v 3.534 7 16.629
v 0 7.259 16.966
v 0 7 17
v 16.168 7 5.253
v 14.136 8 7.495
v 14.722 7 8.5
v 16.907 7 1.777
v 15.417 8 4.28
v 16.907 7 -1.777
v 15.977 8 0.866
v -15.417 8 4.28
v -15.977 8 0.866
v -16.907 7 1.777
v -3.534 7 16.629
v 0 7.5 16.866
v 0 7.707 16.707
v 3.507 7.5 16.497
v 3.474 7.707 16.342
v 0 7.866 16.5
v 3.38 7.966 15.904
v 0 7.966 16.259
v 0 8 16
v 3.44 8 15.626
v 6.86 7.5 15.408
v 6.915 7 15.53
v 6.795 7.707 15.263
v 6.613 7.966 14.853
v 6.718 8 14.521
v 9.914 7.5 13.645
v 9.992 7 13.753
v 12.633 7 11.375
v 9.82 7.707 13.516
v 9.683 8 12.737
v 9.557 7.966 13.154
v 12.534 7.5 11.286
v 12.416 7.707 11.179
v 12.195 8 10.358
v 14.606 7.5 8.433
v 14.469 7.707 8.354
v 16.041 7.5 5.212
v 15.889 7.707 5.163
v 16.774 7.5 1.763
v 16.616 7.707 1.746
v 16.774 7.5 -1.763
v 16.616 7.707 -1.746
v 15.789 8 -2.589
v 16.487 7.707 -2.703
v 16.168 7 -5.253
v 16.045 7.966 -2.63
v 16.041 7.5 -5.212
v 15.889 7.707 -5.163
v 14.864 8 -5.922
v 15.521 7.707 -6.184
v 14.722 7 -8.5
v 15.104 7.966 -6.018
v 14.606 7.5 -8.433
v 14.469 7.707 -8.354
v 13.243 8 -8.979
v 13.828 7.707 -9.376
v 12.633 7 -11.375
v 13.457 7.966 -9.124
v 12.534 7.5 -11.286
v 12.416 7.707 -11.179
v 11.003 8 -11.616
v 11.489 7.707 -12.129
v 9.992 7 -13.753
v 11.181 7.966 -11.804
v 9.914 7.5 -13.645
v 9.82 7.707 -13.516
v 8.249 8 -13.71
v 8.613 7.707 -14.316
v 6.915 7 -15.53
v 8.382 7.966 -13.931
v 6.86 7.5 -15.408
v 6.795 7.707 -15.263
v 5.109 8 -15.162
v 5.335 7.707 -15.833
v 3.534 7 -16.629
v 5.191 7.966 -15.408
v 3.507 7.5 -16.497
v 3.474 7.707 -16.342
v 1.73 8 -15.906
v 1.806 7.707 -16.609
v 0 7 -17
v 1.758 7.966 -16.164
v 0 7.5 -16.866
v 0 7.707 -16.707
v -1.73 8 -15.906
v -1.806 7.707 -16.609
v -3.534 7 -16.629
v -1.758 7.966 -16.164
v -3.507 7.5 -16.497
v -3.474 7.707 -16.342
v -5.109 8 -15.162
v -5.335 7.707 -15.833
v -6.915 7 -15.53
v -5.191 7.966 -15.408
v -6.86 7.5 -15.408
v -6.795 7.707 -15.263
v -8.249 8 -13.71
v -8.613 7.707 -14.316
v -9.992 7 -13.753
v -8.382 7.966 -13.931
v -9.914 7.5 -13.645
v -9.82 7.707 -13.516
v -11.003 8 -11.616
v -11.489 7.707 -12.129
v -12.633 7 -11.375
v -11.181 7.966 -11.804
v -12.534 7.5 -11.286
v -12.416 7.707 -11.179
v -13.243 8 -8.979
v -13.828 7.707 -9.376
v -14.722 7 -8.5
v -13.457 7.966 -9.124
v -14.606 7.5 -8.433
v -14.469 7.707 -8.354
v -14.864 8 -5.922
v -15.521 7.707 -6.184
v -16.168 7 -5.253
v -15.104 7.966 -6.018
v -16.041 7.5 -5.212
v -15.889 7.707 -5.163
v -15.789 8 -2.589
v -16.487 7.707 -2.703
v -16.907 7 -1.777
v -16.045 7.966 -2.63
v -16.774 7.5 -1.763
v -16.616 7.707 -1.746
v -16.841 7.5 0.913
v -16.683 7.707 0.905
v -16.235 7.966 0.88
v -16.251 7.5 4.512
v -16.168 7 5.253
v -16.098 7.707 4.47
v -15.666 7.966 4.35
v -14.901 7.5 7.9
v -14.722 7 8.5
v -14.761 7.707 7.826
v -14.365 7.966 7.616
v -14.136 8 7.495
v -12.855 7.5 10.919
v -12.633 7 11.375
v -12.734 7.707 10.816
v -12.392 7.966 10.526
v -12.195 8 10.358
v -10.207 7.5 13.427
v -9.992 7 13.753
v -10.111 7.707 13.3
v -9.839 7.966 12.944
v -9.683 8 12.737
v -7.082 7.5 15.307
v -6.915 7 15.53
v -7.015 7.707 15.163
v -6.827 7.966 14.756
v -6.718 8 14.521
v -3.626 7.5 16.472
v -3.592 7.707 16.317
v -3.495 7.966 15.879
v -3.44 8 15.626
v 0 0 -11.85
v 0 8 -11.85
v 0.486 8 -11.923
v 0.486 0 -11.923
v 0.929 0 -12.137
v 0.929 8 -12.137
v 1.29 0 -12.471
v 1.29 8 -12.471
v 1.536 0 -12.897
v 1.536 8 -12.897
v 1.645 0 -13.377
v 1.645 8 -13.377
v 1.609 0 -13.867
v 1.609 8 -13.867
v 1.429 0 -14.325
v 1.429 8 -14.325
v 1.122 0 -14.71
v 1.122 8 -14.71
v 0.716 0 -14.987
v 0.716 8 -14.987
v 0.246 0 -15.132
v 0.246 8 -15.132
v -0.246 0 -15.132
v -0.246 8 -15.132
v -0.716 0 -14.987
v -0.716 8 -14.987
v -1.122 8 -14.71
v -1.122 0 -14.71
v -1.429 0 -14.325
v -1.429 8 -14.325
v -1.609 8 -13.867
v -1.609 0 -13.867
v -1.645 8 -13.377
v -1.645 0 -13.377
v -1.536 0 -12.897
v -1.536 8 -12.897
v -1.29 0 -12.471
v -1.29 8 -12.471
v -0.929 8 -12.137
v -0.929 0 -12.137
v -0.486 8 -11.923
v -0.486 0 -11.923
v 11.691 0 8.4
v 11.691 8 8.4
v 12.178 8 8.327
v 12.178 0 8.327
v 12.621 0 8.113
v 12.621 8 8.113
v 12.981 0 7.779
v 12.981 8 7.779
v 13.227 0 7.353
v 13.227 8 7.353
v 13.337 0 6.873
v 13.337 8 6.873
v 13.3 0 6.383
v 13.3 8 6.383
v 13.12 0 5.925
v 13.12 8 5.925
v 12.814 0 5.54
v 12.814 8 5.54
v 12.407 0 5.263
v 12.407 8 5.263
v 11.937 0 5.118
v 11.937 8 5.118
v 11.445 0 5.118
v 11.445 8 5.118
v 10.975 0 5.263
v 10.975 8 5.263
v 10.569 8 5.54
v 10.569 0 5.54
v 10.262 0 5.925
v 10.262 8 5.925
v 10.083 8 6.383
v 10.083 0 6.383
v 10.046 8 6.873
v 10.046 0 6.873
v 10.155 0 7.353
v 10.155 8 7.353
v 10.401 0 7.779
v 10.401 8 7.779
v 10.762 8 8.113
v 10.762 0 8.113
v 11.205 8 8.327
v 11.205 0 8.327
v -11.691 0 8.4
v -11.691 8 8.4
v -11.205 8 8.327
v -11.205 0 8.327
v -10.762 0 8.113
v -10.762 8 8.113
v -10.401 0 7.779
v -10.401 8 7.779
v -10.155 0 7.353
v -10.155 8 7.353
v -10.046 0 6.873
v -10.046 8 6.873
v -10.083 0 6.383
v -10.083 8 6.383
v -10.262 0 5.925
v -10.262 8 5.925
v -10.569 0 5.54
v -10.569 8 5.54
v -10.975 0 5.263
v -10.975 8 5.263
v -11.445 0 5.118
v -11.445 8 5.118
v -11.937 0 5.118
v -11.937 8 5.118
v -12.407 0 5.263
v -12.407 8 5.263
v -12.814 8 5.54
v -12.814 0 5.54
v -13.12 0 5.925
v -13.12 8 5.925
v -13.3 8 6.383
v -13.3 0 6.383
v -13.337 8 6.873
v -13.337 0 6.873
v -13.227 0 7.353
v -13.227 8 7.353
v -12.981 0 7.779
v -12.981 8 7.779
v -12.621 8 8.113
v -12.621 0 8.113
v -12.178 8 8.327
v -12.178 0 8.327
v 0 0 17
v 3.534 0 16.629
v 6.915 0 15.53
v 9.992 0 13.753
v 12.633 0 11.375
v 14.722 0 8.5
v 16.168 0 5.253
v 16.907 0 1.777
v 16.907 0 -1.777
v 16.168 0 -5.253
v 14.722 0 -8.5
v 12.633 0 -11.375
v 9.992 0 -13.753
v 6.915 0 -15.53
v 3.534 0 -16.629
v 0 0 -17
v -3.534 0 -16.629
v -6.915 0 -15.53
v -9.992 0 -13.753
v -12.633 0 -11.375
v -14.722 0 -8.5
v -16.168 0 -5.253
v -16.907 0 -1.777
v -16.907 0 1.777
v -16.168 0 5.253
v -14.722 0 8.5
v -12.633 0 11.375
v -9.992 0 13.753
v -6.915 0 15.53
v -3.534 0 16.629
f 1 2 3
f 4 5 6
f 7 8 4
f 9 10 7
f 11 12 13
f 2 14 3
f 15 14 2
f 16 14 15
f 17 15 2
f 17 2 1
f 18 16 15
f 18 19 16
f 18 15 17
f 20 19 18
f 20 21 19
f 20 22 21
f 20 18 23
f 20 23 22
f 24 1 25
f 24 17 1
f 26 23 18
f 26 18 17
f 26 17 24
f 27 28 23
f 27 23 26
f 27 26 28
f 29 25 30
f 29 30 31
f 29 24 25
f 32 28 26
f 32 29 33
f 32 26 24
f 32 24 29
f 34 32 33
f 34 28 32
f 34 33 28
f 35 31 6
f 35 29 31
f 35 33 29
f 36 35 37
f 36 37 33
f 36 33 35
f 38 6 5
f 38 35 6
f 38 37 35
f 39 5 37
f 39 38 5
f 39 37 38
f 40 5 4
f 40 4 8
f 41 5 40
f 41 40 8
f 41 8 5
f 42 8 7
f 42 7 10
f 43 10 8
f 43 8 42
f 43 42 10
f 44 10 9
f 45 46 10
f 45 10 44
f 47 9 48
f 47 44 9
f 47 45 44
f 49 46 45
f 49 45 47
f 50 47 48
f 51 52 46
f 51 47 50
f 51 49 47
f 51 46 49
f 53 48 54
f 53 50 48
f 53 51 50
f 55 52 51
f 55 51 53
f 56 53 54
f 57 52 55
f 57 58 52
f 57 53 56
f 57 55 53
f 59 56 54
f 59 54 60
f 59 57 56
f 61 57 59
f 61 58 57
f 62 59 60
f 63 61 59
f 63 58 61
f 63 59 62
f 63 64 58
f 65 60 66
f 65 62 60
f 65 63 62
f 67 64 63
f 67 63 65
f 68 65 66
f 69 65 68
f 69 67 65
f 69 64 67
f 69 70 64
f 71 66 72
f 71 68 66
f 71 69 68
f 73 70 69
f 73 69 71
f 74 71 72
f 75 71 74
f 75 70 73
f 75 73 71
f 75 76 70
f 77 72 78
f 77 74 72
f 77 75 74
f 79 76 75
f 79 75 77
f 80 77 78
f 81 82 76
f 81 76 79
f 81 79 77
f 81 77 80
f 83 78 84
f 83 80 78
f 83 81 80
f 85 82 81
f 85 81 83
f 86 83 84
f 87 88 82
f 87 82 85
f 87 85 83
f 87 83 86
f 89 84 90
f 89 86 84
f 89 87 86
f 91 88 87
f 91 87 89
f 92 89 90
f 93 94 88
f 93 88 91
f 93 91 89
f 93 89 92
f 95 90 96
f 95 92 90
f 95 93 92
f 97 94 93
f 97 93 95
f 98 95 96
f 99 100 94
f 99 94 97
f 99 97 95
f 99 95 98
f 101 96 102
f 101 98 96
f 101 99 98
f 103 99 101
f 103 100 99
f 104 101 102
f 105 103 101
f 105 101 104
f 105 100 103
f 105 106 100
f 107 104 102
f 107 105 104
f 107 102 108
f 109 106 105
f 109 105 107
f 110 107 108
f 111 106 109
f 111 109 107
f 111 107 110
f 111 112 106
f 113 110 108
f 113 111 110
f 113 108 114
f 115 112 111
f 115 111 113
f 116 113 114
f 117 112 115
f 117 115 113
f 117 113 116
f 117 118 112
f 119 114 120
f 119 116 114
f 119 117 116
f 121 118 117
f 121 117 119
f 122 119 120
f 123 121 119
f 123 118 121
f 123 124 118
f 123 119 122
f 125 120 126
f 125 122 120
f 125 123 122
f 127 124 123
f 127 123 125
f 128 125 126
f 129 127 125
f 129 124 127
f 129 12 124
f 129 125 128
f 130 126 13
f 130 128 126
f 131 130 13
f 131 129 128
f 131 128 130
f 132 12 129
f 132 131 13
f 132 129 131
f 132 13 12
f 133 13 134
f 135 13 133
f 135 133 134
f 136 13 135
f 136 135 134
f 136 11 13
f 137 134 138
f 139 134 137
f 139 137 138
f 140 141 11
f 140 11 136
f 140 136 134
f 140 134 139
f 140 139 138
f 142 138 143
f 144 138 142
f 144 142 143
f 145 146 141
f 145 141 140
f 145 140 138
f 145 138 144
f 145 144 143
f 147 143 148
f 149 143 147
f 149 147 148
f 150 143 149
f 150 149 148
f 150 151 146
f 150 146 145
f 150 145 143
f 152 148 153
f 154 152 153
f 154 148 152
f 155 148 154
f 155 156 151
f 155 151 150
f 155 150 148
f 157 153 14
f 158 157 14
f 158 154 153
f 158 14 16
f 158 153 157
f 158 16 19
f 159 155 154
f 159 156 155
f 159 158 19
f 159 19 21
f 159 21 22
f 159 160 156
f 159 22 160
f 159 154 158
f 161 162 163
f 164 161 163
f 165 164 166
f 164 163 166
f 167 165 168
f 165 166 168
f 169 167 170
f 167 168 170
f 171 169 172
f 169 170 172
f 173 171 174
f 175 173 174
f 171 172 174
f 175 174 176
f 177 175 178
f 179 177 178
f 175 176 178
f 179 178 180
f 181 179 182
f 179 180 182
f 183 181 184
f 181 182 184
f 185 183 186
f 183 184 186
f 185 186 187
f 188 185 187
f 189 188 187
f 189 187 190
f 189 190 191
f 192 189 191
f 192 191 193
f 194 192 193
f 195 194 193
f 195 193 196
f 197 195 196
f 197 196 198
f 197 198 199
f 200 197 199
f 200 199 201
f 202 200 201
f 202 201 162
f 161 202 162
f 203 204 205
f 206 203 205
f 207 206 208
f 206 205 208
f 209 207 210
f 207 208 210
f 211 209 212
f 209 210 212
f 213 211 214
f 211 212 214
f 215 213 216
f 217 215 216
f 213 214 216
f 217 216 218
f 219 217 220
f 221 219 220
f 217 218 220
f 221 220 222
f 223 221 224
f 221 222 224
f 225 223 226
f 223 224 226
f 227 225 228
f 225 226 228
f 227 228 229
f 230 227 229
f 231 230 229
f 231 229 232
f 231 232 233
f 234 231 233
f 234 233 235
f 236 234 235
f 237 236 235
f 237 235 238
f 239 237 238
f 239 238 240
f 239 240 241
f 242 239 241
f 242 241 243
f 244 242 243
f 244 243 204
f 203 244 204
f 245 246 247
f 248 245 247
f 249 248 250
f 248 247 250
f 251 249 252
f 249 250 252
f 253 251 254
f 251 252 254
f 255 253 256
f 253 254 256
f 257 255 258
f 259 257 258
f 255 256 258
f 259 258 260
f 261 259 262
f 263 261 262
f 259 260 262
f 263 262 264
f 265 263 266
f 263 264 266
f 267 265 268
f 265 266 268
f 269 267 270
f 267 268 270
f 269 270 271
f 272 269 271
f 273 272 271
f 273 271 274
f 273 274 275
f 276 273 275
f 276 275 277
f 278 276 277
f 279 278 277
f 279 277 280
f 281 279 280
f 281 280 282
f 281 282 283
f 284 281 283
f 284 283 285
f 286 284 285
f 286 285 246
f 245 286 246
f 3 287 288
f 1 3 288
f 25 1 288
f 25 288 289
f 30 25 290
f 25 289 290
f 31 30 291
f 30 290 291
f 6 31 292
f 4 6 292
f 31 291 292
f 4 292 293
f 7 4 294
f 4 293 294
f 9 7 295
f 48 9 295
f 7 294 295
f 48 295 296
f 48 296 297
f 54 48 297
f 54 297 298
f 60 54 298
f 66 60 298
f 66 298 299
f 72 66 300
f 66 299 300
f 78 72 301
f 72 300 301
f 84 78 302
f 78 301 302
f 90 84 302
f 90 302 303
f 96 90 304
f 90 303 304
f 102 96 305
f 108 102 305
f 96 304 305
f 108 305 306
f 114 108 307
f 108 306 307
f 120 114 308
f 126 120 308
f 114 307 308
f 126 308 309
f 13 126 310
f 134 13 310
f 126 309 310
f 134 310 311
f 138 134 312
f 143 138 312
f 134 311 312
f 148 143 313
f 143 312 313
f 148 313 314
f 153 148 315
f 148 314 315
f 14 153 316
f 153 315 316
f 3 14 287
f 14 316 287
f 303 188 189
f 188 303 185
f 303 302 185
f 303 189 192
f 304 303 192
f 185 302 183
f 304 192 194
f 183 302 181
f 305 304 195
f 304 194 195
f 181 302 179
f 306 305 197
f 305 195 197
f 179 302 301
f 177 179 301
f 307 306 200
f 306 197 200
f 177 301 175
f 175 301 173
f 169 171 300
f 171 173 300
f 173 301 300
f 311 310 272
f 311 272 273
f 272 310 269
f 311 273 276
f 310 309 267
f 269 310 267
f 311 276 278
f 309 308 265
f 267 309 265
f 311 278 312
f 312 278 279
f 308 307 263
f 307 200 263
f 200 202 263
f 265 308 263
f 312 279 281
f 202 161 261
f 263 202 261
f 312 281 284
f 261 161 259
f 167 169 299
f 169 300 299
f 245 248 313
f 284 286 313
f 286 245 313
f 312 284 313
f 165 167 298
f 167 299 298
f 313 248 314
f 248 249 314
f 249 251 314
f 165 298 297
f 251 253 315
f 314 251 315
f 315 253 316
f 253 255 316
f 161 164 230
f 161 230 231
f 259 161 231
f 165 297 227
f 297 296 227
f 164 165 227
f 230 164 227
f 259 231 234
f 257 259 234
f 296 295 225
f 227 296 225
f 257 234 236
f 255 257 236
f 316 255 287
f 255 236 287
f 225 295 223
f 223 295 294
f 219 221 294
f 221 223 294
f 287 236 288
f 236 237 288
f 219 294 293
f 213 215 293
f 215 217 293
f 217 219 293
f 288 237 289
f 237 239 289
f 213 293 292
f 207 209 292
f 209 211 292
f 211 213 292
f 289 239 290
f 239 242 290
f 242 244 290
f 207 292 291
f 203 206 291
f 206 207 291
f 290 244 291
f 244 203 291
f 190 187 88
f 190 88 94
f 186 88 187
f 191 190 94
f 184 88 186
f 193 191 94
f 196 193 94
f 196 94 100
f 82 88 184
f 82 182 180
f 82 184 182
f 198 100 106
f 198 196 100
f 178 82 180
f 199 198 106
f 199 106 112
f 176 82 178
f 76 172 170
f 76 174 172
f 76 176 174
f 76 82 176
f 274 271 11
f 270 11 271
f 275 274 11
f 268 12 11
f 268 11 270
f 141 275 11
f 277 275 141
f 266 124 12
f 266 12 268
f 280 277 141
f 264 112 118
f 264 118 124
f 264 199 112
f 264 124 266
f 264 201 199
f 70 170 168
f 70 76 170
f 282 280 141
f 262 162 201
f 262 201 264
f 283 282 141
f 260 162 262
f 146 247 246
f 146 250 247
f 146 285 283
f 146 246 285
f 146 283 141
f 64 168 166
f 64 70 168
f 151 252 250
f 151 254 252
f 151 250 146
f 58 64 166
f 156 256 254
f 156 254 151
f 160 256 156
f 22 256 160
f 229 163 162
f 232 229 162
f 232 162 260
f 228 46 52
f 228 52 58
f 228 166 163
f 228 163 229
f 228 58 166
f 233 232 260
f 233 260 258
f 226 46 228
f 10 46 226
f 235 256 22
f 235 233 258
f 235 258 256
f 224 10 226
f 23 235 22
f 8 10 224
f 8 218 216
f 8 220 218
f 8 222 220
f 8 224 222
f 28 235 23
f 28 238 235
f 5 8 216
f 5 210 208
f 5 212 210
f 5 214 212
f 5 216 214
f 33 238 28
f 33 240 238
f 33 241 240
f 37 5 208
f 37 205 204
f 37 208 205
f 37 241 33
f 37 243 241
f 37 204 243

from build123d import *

# Parameters (mm, degrees)
SKETCH_1_R          = 17
EXTRUDE_1_DEPTH     = 8
SKETCH_2_R          = 1.65
CUT_EXTRUDE_1_DEPTH = 20
FILLET_1_R          = 1


with BuildPart() as part:
    # Эскиз1 → Бобышка-Вытянуть1 (new body)
    with BuildSketch(Plane(origin=(0, 0, 0), x_dir=(1, 0, 0), z_dir=(0, 1, 0))):
        with Locations(Location((0, 0, 0), (0, 0, 270))):
            Circle(SKETCH_1_R)
    extrude(amount=EXTRUDE_1_DEPTH)

    # Эскиз2 → Вырез-Вытянуть1 (cut)
    with BuildSketch(Plane(origin=(0, 8, 0), x_dir=(1, 0, 0), z_dir=(0, 1, 0))):
        with Locations(Location((0, 13.5, 0), (0, 0, 270))):
            Circle(SKETCH_2_R)
        with Locations(Location((11.691342951, -6.75, 0), (0, 0, 270))):
            Circle(SKETCH_2_R)
        with Locations(Location((-11.691342951, -6.75, 0), (0, 0, 270))):
            Circle(SKETCH_2_R)
    extrude(amount=-CUT_EXTRUDE_1_DEPTH, mode=Mode.SUBTRACT)

    # Скругление1
    fillet_1_edges = [part.edges().sort_by_distance(p)[0] for p in [
        (0, 8, -17),
    ]]
    fillet(fillet_1_edges, radius=FILLET_1_R)


solid = part.part
